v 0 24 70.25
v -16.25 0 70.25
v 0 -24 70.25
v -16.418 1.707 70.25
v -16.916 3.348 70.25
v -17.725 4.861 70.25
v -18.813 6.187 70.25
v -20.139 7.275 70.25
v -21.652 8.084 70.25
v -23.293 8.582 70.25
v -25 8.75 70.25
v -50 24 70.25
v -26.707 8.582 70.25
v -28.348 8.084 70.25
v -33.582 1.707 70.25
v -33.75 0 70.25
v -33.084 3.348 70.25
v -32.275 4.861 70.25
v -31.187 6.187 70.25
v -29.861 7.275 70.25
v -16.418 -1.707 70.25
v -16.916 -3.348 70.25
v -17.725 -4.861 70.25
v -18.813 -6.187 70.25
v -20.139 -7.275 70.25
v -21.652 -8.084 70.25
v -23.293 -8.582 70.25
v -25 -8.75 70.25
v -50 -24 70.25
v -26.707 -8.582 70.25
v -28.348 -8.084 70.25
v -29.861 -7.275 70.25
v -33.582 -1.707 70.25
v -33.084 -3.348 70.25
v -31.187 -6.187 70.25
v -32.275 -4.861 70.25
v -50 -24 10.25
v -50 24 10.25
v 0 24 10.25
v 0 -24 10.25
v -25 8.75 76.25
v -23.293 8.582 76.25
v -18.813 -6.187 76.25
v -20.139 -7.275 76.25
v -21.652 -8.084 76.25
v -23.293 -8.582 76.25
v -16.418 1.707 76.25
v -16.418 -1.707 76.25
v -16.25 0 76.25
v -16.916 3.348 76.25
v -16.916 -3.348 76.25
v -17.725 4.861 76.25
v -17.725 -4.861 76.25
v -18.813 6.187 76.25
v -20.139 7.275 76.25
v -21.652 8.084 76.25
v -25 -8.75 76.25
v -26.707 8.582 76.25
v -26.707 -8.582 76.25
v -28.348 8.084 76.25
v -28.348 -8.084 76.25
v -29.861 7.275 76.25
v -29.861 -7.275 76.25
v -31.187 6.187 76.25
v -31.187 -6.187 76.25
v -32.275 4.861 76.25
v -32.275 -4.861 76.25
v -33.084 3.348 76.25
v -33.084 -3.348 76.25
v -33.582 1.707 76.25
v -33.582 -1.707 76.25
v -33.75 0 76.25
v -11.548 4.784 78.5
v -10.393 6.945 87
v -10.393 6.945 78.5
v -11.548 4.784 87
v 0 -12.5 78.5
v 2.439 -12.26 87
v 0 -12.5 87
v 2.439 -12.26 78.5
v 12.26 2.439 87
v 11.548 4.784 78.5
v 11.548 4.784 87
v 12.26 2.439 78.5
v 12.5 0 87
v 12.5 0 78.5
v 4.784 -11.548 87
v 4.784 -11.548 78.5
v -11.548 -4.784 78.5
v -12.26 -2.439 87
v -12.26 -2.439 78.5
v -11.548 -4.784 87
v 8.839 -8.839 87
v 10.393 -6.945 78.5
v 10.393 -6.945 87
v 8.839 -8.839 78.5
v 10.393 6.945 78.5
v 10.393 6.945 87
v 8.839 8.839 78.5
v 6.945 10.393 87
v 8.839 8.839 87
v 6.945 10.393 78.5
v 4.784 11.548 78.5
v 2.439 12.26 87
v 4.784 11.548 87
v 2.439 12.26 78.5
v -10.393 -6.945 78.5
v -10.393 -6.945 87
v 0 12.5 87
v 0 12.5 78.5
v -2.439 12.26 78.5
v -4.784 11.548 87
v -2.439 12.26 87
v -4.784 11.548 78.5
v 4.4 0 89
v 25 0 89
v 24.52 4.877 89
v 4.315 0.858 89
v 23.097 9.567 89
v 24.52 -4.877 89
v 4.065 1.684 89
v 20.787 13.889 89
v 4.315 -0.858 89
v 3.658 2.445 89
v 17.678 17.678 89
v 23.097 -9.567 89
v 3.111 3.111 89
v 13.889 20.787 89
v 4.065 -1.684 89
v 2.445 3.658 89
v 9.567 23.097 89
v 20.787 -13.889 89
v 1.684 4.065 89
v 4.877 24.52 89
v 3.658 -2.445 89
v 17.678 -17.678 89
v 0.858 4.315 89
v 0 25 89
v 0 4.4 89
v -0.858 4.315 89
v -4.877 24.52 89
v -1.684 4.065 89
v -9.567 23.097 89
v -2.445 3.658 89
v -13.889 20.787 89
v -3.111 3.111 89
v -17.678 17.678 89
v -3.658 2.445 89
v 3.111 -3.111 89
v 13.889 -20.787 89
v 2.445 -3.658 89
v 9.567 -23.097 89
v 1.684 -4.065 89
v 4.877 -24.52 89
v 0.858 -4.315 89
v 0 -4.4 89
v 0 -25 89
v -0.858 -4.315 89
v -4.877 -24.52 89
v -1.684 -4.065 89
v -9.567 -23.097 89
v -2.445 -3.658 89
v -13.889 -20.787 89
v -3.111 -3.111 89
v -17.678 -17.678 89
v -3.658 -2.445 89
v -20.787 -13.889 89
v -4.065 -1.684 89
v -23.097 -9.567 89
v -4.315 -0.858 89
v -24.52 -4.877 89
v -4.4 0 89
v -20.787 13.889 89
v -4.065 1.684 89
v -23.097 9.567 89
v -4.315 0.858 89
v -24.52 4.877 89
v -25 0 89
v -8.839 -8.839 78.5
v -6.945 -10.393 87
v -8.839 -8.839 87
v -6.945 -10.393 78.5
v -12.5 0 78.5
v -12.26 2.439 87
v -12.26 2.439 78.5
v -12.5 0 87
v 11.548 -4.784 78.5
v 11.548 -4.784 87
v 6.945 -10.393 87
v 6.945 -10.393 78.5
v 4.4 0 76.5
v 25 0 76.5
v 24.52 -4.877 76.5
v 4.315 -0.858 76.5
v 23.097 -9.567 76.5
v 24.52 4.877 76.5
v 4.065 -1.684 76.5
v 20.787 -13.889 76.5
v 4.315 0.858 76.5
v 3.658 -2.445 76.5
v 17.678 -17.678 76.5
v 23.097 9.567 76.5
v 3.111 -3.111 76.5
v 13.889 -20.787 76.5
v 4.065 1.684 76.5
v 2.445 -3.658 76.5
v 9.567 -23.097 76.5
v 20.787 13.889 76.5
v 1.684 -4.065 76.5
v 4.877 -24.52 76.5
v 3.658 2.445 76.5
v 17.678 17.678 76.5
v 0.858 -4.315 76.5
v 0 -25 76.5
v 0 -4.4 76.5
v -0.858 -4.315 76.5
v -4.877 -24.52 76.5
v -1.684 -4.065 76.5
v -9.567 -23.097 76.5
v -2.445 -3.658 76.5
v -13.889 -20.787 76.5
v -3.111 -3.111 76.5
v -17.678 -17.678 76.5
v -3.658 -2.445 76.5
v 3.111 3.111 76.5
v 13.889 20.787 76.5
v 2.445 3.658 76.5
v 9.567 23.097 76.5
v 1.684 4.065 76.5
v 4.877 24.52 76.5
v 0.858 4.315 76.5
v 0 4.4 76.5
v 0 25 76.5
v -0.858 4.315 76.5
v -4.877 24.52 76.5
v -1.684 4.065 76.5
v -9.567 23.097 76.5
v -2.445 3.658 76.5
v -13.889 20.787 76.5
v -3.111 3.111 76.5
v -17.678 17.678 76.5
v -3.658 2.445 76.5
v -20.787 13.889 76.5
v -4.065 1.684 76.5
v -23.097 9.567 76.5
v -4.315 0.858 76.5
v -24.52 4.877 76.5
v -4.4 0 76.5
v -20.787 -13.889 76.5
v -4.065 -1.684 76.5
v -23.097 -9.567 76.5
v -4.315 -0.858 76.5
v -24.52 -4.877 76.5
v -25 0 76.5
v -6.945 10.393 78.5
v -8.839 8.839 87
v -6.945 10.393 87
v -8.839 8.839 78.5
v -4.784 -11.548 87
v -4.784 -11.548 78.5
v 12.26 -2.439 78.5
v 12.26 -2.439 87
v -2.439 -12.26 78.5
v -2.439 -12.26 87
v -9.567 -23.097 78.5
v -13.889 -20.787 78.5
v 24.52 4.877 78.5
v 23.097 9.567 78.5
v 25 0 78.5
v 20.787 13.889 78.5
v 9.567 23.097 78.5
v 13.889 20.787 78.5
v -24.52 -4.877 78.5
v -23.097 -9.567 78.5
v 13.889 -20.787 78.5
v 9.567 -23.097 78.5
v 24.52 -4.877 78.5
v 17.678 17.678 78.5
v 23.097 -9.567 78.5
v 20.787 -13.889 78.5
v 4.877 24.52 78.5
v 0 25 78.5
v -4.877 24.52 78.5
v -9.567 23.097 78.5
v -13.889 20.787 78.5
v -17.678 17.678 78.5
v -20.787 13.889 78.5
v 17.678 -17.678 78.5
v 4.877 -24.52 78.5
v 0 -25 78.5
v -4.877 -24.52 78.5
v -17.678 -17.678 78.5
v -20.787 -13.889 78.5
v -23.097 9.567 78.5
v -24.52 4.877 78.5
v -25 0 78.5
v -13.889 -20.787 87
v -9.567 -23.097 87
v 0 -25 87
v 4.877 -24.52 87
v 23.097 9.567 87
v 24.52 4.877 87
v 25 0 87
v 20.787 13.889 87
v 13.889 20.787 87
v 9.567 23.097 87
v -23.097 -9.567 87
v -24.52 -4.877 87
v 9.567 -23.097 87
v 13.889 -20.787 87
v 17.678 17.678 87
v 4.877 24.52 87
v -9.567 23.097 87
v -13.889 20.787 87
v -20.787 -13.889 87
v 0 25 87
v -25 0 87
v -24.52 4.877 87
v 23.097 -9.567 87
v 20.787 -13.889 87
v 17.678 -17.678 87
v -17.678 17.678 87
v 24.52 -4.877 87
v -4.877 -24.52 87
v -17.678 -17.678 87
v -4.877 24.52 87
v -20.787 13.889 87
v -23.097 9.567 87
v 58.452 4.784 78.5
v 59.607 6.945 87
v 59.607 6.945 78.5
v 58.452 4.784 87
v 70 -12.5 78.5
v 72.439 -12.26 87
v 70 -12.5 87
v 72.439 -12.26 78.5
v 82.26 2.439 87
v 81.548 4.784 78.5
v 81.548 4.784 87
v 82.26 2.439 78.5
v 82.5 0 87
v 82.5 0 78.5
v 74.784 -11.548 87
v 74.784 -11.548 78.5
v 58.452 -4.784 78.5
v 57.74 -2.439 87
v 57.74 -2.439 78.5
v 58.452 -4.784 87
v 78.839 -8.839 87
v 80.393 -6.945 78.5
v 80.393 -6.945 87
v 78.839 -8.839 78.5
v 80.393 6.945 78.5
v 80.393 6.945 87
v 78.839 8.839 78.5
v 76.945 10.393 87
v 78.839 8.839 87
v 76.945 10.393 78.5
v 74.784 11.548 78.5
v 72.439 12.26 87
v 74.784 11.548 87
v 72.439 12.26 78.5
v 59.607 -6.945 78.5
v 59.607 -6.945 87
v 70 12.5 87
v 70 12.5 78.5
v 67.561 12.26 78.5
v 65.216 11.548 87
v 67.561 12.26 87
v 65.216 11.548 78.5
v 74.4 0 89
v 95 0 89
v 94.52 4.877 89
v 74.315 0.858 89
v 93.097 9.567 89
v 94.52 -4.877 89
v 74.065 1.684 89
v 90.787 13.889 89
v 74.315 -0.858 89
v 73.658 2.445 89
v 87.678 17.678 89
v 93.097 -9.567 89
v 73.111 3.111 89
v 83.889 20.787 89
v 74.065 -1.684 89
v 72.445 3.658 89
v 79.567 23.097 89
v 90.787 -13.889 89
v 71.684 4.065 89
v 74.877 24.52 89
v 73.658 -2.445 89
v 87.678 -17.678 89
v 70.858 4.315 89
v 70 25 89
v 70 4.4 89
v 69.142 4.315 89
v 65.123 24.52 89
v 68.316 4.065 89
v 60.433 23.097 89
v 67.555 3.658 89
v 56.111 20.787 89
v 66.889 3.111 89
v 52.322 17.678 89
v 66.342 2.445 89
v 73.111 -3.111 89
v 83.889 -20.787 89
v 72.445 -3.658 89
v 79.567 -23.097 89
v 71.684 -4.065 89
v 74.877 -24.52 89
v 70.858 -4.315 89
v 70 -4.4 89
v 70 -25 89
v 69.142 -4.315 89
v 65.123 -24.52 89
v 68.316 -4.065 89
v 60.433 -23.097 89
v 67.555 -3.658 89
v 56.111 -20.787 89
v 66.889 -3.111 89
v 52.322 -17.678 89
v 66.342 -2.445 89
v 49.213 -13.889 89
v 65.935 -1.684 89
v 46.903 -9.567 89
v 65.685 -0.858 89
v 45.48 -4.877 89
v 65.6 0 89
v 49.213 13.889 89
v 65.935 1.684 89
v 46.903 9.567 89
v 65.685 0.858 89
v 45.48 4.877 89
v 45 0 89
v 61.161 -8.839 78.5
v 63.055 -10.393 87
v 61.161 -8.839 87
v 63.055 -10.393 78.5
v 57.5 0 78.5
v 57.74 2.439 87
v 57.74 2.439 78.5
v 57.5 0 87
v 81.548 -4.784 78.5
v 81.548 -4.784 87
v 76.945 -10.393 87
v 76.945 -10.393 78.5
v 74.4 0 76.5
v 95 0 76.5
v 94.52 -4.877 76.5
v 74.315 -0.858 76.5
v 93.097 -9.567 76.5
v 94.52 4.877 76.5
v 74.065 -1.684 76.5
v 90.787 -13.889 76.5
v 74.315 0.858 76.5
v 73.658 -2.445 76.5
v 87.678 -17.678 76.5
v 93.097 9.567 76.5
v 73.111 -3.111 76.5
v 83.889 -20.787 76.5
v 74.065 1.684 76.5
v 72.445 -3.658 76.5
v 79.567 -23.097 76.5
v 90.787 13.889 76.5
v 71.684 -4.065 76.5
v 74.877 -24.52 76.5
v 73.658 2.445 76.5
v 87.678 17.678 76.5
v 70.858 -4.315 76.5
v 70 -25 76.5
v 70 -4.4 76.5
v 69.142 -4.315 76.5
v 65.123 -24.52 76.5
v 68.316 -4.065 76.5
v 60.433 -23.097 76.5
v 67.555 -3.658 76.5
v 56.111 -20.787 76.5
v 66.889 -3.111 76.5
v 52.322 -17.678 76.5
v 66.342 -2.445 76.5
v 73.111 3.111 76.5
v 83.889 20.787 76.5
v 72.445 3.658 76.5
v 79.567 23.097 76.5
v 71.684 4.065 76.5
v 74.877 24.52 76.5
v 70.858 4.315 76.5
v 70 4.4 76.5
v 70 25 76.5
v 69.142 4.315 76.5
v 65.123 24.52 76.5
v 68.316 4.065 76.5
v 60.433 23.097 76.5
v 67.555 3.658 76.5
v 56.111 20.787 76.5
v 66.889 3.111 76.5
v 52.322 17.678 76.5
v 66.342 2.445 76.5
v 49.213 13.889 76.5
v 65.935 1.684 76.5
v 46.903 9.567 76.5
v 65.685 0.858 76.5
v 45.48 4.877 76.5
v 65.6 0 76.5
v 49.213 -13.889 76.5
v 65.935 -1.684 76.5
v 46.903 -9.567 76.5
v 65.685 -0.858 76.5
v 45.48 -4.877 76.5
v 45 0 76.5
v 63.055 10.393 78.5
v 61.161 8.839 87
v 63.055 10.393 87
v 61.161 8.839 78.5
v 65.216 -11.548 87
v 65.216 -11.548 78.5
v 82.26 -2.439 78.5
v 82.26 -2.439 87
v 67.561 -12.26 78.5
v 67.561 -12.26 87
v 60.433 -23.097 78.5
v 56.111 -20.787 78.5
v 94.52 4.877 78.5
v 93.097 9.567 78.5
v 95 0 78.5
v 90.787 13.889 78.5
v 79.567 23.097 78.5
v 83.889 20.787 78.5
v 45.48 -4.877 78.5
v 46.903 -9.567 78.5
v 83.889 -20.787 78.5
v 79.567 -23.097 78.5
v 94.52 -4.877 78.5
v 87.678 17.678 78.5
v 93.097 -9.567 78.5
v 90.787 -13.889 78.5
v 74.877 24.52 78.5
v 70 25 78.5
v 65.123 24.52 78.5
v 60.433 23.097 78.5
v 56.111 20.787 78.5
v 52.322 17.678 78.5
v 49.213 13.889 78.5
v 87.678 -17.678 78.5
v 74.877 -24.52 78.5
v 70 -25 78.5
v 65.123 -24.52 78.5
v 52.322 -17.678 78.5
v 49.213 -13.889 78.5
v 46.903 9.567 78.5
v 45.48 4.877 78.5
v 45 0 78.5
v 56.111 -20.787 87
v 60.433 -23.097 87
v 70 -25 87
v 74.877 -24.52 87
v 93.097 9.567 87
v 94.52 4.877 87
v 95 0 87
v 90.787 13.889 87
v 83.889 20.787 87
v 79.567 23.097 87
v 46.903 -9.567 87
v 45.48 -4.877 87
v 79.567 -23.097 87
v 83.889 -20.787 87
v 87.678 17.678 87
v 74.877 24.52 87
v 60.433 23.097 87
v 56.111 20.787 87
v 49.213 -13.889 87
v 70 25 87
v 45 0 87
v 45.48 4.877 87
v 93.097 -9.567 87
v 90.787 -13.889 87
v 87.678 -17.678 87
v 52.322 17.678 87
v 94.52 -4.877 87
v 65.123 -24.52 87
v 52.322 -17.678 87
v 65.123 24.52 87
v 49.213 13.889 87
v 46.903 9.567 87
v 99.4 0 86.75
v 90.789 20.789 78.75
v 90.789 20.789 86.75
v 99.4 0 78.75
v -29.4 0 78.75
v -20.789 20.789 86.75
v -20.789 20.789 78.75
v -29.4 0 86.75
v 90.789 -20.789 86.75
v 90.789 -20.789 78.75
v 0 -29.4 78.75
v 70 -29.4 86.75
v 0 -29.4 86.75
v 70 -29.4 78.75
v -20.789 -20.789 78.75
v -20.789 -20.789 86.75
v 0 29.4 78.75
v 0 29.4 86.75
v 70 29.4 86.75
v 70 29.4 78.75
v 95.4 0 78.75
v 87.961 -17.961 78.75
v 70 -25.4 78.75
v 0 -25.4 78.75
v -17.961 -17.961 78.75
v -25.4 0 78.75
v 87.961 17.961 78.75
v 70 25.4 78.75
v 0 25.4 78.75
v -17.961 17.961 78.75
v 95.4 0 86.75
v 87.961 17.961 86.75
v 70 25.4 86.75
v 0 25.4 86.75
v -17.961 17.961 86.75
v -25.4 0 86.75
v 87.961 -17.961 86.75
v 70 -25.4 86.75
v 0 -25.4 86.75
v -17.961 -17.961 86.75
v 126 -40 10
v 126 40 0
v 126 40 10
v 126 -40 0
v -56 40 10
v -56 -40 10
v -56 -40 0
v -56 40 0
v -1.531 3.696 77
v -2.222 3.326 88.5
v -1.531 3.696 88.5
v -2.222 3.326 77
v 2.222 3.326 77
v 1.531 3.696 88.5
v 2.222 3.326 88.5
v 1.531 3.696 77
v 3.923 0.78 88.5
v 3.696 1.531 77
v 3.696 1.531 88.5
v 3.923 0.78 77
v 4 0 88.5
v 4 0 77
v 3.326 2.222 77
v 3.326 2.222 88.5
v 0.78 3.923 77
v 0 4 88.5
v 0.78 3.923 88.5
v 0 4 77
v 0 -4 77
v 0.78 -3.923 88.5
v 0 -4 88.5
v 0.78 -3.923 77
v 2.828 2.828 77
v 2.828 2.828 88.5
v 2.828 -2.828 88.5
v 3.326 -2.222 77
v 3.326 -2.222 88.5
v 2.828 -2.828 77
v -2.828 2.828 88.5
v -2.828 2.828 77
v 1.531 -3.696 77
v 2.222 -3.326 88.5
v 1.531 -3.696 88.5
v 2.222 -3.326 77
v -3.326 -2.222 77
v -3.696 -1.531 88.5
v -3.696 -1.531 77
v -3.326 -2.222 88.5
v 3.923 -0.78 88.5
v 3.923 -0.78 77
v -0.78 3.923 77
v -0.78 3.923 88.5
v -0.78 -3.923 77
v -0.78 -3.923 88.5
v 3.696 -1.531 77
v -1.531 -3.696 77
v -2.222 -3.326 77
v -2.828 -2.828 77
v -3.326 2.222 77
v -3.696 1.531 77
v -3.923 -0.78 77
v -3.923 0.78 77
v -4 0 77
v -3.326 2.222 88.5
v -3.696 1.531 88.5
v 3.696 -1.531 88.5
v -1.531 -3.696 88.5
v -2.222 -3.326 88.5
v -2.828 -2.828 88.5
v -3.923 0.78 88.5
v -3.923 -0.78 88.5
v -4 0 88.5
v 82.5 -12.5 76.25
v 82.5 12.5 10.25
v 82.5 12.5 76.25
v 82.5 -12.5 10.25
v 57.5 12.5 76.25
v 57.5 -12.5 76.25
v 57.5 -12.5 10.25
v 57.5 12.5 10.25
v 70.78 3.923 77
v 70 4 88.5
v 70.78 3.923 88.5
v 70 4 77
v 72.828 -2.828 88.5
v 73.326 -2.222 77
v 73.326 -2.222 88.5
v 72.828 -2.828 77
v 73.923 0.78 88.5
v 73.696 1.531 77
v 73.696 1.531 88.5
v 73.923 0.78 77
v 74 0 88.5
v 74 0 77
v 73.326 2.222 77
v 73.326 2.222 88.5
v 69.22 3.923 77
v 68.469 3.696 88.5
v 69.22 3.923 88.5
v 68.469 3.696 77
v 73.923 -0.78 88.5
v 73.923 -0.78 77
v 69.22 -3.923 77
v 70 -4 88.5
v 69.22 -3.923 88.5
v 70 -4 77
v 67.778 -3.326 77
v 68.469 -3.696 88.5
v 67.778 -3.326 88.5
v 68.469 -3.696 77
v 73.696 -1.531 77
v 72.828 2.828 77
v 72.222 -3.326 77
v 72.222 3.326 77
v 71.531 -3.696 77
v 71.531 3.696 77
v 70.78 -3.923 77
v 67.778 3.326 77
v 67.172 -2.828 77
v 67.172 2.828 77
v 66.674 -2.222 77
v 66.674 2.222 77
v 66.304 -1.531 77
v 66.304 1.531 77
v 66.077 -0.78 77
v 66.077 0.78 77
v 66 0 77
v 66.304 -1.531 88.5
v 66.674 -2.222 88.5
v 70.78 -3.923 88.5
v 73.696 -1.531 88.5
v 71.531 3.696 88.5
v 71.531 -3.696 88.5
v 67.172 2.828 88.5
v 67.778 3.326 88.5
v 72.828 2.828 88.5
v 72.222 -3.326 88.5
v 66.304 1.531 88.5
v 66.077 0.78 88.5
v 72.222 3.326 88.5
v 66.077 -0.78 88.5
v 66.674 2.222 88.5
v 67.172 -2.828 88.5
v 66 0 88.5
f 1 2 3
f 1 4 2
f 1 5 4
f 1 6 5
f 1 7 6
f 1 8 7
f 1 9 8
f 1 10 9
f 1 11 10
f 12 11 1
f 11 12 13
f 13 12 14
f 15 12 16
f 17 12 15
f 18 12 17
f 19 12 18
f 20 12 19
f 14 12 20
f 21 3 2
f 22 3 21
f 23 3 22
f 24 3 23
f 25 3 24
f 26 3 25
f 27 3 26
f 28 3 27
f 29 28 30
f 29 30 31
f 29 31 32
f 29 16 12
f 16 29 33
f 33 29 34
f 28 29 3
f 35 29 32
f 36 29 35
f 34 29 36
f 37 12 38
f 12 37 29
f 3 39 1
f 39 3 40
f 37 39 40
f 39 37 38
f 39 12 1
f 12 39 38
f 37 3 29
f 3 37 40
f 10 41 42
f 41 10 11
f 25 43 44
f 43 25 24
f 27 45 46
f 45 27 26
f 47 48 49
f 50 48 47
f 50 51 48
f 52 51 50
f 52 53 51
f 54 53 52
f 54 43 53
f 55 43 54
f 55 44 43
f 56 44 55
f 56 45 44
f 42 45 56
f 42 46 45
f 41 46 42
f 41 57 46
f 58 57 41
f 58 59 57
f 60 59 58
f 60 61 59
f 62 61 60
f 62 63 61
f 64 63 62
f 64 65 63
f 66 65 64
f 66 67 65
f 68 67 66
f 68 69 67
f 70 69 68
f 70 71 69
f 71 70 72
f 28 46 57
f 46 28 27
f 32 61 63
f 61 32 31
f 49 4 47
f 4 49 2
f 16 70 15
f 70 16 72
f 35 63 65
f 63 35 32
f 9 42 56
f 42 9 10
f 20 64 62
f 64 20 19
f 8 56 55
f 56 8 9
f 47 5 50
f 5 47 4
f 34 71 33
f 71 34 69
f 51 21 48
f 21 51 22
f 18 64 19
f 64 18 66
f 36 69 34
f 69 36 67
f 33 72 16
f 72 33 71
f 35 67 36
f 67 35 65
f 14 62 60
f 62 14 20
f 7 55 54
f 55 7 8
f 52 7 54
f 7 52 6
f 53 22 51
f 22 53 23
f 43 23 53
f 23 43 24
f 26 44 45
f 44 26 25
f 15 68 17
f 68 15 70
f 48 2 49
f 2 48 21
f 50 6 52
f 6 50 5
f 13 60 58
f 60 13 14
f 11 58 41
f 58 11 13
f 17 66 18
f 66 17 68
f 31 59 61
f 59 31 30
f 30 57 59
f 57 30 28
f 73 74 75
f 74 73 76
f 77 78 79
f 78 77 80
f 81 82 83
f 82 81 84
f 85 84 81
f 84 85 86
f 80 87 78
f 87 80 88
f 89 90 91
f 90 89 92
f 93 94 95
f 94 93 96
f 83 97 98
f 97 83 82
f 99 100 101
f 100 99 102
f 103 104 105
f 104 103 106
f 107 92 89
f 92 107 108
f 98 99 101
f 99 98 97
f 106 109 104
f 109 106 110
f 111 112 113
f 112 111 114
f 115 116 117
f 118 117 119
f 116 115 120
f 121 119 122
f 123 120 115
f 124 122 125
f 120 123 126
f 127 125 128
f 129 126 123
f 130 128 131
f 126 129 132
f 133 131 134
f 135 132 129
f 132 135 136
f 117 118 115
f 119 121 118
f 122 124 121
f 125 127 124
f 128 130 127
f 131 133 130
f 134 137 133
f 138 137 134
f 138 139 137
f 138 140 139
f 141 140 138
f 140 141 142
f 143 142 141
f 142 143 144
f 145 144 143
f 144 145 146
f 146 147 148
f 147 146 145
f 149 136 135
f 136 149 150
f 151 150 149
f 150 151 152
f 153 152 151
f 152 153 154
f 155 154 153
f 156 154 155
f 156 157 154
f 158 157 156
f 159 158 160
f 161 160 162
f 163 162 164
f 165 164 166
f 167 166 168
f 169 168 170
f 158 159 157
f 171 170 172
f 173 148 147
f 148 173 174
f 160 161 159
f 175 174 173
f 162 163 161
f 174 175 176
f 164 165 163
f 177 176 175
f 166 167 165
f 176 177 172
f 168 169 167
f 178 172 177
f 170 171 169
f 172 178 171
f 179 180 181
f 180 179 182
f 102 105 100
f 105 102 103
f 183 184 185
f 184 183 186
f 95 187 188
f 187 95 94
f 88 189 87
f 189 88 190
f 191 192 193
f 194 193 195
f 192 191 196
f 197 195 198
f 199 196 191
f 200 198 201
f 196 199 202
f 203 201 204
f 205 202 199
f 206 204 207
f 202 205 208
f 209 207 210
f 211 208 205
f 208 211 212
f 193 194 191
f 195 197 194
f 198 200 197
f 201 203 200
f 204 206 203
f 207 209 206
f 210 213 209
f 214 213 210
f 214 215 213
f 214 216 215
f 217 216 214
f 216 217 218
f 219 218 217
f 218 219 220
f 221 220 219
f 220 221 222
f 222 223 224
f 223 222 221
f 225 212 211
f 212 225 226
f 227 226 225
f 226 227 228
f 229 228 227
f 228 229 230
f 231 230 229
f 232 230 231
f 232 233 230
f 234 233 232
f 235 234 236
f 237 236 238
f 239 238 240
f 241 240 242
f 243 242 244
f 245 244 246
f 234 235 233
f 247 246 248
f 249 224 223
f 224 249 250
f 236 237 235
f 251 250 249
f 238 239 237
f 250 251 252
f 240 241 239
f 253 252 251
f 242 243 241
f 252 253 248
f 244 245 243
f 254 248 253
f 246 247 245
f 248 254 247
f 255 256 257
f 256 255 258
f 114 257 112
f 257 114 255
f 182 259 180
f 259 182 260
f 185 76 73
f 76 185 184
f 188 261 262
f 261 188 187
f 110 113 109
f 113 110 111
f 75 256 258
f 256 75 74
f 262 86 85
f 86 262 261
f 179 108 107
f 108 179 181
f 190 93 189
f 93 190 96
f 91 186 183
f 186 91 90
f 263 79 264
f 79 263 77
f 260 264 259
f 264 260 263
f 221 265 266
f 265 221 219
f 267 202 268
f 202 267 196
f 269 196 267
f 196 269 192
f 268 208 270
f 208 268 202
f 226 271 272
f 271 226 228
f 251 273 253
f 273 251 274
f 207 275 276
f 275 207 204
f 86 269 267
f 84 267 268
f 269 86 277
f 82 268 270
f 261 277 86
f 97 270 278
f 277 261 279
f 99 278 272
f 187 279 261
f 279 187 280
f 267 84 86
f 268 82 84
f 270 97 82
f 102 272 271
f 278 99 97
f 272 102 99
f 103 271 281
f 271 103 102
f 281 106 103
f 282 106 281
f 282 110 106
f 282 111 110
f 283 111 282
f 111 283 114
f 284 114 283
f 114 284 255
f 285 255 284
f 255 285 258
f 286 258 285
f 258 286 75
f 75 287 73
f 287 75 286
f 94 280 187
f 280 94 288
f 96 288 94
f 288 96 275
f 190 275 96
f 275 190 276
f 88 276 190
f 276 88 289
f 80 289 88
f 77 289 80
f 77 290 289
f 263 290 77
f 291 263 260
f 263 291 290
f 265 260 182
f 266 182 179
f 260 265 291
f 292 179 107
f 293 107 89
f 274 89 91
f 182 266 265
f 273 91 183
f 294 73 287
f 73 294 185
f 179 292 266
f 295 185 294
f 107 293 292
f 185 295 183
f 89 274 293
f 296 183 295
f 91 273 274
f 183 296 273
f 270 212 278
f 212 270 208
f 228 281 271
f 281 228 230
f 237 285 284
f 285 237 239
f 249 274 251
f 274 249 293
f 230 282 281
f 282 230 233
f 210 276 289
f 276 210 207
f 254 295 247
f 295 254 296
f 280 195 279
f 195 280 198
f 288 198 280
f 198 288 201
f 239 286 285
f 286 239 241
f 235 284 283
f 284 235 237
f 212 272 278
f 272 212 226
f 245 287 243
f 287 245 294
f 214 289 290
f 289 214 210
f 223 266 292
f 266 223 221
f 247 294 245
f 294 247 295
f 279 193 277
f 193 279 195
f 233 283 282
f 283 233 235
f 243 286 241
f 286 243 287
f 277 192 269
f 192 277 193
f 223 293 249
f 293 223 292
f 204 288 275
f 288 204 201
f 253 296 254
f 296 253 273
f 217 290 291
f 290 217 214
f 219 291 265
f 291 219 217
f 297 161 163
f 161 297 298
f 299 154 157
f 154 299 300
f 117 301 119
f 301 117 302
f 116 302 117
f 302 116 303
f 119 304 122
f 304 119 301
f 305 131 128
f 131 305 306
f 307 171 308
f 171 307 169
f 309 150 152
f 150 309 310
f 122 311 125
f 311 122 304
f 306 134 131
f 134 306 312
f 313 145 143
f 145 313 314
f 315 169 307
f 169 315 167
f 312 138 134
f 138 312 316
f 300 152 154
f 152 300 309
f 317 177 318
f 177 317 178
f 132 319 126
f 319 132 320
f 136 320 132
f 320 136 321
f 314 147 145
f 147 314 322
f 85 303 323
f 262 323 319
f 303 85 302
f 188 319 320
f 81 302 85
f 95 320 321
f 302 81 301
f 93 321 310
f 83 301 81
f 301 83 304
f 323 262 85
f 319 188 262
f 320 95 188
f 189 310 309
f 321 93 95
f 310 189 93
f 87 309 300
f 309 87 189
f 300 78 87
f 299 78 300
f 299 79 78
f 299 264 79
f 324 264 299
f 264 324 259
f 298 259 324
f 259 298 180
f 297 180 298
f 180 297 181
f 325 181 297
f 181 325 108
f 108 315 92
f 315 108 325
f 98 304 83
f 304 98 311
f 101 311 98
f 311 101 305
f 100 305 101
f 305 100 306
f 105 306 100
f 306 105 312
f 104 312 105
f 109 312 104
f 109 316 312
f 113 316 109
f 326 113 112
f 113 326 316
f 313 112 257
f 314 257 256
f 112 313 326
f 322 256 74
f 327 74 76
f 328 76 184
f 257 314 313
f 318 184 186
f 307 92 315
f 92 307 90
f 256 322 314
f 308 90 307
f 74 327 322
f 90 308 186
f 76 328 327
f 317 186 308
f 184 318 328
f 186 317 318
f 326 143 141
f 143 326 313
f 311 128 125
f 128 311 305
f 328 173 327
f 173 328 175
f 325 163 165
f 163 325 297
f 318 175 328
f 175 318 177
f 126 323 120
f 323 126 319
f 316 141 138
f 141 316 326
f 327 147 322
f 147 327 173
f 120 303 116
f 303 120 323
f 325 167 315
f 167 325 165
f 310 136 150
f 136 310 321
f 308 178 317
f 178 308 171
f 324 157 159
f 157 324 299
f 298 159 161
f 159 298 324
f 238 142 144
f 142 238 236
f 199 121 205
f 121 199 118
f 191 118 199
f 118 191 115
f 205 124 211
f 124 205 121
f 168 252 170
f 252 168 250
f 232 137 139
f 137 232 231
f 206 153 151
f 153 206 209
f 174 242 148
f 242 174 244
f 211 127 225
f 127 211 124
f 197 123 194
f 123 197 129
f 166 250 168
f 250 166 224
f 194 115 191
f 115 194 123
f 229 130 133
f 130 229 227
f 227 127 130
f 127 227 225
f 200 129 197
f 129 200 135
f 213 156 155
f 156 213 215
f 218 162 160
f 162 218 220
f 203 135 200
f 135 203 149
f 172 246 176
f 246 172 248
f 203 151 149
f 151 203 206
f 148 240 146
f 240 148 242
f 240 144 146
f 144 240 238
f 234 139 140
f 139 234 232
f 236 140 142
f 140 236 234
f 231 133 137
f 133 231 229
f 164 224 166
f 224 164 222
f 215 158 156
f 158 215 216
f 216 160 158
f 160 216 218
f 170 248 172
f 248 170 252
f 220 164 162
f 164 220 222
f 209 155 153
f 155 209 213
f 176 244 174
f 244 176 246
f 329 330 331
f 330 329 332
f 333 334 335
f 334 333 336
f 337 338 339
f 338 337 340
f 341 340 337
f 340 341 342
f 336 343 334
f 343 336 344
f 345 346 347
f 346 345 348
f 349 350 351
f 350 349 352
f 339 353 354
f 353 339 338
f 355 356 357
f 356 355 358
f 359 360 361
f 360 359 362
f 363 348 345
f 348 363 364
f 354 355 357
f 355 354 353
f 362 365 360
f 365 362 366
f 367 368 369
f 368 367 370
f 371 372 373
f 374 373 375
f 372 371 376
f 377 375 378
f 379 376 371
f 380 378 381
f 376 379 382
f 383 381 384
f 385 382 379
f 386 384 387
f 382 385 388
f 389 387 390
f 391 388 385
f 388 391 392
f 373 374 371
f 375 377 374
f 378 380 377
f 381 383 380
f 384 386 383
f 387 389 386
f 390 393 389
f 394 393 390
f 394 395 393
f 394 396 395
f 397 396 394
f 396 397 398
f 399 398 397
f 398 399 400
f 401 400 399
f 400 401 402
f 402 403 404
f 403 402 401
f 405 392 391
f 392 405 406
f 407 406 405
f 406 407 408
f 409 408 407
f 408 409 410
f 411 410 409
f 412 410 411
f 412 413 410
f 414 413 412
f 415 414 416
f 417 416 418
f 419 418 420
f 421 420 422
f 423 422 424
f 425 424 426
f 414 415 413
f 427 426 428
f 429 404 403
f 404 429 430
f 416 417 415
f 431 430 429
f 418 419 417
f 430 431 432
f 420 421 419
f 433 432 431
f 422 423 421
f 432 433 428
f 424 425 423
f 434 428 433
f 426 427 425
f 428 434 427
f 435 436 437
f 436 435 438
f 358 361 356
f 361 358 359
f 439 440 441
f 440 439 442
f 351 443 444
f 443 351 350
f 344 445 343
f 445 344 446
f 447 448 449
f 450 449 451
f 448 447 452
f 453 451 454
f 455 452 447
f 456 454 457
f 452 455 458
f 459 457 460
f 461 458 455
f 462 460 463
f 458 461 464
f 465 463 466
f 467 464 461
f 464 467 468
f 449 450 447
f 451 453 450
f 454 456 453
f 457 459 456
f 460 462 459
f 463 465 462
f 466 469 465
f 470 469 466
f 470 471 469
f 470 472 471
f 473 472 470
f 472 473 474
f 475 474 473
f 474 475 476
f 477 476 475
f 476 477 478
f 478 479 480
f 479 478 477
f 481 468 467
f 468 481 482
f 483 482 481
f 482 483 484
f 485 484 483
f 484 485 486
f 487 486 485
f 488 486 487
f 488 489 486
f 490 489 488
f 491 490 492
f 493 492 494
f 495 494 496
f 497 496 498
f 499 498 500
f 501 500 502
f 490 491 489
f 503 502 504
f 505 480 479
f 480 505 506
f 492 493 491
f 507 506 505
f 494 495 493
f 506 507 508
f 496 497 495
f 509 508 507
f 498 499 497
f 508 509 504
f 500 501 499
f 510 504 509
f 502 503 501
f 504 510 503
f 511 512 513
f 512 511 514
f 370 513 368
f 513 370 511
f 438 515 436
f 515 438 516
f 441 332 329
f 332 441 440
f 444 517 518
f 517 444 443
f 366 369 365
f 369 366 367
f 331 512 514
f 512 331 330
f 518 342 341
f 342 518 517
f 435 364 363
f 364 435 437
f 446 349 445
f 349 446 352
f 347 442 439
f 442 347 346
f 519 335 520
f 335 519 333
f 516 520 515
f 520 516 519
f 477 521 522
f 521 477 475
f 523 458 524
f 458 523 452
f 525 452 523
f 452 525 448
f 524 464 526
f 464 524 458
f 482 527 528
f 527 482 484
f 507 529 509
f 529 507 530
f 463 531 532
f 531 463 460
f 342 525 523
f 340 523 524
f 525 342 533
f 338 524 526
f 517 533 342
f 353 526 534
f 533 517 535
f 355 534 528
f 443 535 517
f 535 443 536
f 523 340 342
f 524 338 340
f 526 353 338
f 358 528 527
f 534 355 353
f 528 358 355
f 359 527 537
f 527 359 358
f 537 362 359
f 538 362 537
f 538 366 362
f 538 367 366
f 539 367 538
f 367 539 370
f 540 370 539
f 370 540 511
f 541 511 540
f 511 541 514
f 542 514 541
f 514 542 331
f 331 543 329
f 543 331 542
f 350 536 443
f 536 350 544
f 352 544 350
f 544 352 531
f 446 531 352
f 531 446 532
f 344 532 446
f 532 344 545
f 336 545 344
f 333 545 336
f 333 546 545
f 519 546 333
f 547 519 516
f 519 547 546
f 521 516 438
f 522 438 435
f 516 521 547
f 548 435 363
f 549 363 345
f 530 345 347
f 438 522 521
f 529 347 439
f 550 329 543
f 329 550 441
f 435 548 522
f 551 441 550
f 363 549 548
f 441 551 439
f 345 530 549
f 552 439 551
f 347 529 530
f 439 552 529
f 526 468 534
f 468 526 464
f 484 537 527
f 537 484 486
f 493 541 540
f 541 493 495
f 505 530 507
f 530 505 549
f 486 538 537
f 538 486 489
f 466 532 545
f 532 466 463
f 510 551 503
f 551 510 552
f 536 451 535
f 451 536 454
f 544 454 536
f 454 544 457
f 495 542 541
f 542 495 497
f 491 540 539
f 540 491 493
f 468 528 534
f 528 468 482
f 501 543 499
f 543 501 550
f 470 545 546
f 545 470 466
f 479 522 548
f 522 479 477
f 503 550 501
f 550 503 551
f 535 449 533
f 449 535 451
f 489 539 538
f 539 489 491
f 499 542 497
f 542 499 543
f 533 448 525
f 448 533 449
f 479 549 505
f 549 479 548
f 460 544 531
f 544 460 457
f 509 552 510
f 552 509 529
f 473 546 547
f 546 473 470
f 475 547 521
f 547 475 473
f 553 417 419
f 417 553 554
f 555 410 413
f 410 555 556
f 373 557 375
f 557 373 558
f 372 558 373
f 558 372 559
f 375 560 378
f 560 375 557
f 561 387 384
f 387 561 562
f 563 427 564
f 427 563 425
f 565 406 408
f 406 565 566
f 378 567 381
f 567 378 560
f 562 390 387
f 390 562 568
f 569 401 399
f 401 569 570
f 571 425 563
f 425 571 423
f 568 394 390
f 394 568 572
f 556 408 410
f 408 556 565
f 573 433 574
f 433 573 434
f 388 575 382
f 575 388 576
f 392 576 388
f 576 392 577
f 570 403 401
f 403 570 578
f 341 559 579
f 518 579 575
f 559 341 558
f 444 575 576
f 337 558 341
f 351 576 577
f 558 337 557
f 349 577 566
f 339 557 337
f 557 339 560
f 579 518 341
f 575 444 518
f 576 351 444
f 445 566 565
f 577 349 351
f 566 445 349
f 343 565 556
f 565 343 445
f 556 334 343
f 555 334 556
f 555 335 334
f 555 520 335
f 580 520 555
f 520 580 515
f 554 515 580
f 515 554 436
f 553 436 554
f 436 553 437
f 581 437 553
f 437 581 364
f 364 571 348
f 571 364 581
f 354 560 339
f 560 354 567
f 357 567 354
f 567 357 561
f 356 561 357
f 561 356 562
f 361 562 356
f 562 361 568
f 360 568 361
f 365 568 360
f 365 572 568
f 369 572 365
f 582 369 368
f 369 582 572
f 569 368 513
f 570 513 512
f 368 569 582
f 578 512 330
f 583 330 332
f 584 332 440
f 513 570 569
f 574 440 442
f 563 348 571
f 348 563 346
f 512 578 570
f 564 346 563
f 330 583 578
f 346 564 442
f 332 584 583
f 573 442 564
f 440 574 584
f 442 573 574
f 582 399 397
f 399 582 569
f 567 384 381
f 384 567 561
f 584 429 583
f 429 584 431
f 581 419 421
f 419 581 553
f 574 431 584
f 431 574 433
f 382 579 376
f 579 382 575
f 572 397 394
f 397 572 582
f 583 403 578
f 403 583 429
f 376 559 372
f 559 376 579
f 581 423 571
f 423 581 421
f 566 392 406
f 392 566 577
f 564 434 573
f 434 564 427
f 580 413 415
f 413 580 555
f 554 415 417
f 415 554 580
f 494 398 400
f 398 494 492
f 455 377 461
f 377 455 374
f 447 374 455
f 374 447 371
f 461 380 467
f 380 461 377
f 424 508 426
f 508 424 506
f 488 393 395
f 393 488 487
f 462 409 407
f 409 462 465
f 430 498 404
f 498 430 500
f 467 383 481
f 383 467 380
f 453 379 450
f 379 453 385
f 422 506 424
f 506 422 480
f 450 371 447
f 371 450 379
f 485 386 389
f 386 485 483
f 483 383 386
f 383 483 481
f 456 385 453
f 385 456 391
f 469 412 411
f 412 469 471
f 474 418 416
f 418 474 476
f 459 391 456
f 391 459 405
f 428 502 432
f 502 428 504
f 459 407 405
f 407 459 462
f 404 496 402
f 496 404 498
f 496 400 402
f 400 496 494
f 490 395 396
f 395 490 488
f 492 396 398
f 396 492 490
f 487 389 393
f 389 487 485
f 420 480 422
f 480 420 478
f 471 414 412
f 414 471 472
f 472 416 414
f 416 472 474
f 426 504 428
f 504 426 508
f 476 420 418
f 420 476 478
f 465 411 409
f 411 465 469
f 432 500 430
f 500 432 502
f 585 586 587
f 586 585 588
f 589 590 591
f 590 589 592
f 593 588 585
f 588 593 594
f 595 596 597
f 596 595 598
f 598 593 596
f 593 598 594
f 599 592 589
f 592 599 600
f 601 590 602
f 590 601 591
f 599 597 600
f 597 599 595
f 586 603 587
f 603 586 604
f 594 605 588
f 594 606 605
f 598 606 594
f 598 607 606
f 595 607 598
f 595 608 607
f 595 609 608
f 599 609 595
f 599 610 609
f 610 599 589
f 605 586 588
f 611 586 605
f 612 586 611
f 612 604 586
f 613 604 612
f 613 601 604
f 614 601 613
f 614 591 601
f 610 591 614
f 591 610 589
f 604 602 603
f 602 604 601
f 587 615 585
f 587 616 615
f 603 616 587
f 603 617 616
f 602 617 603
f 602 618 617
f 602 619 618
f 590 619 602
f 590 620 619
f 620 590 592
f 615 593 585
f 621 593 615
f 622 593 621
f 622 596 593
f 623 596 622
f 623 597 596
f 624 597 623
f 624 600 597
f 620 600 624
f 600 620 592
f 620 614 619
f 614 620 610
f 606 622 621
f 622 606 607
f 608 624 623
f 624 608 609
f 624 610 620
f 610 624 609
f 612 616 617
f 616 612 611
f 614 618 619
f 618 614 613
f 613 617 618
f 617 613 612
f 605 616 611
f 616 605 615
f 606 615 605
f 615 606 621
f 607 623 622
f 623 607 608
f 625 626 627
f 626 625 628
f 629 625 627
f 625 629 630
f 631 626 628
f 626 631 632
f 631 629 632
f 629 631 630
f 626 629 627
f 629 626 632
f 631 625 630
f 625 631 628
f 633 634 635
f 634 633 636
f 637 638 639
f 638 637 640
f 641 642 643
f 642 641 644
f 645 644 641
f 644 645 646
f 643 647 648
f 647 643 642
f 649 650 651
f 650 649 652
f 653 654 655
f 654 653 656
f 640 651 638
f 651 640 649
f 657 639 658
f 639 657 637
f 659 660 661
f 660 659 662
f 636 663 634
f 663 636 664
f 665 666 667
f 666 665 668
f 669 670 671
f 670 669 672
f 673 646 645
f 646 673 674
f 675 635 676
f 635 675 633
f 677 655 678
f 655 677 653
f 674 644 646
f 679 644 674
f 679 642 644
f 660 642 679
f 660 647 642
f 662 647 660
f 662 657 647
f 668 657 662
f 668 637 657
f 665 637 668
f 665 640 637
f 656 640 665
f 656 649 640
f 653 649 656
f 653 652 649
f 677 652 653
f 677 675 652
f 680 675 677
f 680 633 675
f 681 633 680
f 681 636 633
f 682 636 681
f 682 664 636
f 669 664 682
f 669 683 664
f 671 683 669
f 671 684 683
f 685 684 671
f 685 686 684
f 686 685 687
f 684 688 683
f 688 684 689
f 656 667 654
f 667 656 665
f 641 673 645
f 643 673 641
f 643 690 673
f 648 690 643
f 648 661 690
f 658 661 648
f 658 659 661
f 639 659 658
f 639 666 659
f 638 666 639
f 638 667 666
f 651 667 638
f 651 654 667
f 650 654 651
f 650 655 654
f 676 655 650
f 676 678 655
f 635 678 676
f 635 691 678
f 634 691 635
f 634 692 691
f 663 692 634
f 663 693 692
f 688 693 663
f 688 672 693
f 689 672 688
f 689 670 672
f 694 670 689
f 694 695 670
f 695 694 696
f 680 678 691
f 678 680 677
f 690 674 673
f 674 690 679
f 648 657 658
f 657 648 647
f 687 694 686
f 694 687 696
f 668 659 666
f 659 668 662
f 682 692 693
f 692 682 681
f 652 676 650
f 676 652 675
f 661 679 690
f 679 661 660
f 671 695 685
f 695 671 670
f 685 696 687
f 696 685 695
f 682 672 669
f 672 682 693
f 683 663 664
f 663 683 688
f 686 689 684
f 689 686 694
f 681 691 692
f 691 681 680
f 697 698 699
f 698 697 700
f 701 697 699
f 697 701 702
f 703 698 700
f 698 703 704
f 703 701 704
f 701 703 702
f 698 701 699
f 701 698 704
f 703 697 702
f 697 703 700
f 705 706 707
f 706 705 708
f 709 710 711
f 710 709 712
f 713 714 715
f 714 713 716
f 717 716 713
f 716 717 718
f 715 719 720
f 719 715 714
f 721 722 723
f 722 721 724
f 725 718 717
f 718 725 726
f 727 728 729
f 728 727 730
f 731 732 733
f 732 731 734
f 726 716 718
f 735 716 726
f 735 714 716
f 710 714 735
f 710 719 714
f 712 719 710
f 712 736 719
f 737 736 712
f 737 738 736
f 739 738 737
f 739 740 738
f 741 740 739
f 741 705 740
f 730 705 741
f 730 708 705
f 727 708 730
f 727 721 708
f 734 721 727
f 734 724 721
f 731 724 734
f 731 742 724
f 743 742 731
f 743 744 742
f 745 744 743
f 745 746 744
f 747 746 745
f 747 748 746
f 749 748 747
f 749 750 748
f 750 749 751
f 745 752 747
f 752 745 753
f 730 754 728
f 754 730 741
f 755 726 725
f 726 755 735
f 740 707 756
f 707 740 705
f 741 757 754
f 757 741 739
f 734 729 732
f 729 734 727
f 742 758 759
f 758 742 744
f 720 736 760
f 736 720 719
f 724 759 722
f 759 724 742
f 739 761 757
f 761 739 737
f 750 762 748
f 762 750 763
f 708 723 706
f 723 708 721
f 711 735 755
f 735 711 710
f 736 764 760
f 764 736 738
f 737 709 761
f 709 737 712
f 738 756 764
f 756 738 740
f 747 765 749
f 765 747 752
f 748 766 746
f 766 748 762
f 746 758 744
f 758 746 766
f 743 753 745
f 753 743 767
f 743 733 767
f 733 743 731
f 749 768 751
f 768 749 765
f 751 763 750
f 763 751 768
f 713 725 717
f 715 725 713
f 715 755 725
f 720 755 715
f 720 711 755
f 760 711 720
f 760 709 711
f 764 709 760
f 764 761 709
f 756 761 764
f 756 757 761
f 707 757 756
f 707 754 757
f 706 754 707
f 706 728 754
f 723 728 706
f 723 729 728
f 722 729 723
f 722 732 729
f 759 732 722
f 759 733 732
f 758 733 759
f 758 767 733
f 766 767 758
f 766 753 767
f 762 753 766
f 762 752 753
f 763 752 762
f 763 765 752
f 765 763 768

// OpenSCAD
$fn = 32;

// ------------------------------------------------------------------------
// Motor belt drive: span 70 mm, pulleys d50, belt 8 mm wide
// Every part is its own module, assembly() places every instance.
// ------------------------------------------------------------------------

// --- part 1 ---
module base_plate() {
  difference() {
    translate([-91, -40, 0]) cube([182, 80, 10]);
  }
}

// --- part 2 ---
module motor() {
  union() {
    translate([-30, -24, 0]) cube([60, 48, 50]);
    translate([33, 0, 25]) rotate([0, 90, 0]) cylinder(h = 6, d = 17.5, center = true);
  }
}

// --- part 3 ---
module drive_shaft() {
  translate([0, 0, -5.75]) cylinder(h = 11.5, d = 8);
}

// --- part 4 ---
module pulley_drive() {
  difference() {
    union() {
      cylinder(h = 12.5, d = 25);
      cylinder(h = 2, d = 50);
      translate([0, 0, 10.5]) cylinder(h = 2, d = 50);
    }
    translate([0, 0, -1]) cylinder(h = 14.5, d = 8.8);
  }
}

// --- part 5 ---
module idler_post() {
  translate([-12.5, -12.5, 0]) cube([25, 25, 66]);
}

// --- part 6 ---
module driven_shaft() {
  translate([0, 0, -5.75]) cylinder(h = 11.5, d = 8);
}

// --- part 7 ---
module pulley_driven() {
  difference() {
    union() {
      cylinder(h = 12.5, d = 25);
      cylinder(h = 2, d = 50);
      translate([0, 0, 10.5]) cylinder(h = 2, d = 50);
    }
    translate([0, 0, -1]) cylinder(h = 14.5, d = 8.8);
  }
}

// --- part 8 ---
module drive_belt() {
  difference() {
    linear_extrude(height = 8) polygon(points = concat([for (a = [90 : 45 : 270]) [29.4 * cos(a), 29.4 * sin(a)]], [for (a = [270 : 45 : 450]) [70 + 29.4 * cos(a), 29.4 * sin(a)]]));
    translate([0, 0, -1]) linear_extrude(height = 10) polygon(points = concat([for (a = [90 : 45 : 270]) [25.4 * cos(a), 25.4 * sin(a)]], [for (a = [270 : 45 : 450]) [70 + 25.4 * cos(a), 25.4 * sin(a)]]));
  }
}

// --- assembly ---
module assembly() {
  color([0.80, 0.24, 0.20]) translate([35, 0, 0]) rotate([0, 0, 0]) base_plate();
  color([0.20, 0.45, 0.75]) translate([0, 0, 40.25]) rotate([0, 270, 0]) motor();
  color([0.25, 0.62, 0.32]) translate([0, 0, 82.75]) rotate([0, 0, 0]) drive_shaft();
  color([0.92, 0.70, 0.18]) translate([0, 0, 76.5]) rotate([0, 0, 0]) pulley_drive();
  color([0.58, 0.35, 0.70]) translate([70, 0, 10.25]) rotate([0, 0, 0]) idler_post();
  color([0.16, 0.66, 0.66]) translate([70, 0, 82.75]) rotate([0, 0, 0]) driven_shaft();
  color([0.85, 0.48, 0.18]) translate([70, 0, 76.5]) rotate([0, 0, 0]) pulley_driven();
  color([0.55, 0.60, 0.65]) translate([0, 0, 78.75]) rotate([0, 0, 0]) drive_belt();
}

assembly();
